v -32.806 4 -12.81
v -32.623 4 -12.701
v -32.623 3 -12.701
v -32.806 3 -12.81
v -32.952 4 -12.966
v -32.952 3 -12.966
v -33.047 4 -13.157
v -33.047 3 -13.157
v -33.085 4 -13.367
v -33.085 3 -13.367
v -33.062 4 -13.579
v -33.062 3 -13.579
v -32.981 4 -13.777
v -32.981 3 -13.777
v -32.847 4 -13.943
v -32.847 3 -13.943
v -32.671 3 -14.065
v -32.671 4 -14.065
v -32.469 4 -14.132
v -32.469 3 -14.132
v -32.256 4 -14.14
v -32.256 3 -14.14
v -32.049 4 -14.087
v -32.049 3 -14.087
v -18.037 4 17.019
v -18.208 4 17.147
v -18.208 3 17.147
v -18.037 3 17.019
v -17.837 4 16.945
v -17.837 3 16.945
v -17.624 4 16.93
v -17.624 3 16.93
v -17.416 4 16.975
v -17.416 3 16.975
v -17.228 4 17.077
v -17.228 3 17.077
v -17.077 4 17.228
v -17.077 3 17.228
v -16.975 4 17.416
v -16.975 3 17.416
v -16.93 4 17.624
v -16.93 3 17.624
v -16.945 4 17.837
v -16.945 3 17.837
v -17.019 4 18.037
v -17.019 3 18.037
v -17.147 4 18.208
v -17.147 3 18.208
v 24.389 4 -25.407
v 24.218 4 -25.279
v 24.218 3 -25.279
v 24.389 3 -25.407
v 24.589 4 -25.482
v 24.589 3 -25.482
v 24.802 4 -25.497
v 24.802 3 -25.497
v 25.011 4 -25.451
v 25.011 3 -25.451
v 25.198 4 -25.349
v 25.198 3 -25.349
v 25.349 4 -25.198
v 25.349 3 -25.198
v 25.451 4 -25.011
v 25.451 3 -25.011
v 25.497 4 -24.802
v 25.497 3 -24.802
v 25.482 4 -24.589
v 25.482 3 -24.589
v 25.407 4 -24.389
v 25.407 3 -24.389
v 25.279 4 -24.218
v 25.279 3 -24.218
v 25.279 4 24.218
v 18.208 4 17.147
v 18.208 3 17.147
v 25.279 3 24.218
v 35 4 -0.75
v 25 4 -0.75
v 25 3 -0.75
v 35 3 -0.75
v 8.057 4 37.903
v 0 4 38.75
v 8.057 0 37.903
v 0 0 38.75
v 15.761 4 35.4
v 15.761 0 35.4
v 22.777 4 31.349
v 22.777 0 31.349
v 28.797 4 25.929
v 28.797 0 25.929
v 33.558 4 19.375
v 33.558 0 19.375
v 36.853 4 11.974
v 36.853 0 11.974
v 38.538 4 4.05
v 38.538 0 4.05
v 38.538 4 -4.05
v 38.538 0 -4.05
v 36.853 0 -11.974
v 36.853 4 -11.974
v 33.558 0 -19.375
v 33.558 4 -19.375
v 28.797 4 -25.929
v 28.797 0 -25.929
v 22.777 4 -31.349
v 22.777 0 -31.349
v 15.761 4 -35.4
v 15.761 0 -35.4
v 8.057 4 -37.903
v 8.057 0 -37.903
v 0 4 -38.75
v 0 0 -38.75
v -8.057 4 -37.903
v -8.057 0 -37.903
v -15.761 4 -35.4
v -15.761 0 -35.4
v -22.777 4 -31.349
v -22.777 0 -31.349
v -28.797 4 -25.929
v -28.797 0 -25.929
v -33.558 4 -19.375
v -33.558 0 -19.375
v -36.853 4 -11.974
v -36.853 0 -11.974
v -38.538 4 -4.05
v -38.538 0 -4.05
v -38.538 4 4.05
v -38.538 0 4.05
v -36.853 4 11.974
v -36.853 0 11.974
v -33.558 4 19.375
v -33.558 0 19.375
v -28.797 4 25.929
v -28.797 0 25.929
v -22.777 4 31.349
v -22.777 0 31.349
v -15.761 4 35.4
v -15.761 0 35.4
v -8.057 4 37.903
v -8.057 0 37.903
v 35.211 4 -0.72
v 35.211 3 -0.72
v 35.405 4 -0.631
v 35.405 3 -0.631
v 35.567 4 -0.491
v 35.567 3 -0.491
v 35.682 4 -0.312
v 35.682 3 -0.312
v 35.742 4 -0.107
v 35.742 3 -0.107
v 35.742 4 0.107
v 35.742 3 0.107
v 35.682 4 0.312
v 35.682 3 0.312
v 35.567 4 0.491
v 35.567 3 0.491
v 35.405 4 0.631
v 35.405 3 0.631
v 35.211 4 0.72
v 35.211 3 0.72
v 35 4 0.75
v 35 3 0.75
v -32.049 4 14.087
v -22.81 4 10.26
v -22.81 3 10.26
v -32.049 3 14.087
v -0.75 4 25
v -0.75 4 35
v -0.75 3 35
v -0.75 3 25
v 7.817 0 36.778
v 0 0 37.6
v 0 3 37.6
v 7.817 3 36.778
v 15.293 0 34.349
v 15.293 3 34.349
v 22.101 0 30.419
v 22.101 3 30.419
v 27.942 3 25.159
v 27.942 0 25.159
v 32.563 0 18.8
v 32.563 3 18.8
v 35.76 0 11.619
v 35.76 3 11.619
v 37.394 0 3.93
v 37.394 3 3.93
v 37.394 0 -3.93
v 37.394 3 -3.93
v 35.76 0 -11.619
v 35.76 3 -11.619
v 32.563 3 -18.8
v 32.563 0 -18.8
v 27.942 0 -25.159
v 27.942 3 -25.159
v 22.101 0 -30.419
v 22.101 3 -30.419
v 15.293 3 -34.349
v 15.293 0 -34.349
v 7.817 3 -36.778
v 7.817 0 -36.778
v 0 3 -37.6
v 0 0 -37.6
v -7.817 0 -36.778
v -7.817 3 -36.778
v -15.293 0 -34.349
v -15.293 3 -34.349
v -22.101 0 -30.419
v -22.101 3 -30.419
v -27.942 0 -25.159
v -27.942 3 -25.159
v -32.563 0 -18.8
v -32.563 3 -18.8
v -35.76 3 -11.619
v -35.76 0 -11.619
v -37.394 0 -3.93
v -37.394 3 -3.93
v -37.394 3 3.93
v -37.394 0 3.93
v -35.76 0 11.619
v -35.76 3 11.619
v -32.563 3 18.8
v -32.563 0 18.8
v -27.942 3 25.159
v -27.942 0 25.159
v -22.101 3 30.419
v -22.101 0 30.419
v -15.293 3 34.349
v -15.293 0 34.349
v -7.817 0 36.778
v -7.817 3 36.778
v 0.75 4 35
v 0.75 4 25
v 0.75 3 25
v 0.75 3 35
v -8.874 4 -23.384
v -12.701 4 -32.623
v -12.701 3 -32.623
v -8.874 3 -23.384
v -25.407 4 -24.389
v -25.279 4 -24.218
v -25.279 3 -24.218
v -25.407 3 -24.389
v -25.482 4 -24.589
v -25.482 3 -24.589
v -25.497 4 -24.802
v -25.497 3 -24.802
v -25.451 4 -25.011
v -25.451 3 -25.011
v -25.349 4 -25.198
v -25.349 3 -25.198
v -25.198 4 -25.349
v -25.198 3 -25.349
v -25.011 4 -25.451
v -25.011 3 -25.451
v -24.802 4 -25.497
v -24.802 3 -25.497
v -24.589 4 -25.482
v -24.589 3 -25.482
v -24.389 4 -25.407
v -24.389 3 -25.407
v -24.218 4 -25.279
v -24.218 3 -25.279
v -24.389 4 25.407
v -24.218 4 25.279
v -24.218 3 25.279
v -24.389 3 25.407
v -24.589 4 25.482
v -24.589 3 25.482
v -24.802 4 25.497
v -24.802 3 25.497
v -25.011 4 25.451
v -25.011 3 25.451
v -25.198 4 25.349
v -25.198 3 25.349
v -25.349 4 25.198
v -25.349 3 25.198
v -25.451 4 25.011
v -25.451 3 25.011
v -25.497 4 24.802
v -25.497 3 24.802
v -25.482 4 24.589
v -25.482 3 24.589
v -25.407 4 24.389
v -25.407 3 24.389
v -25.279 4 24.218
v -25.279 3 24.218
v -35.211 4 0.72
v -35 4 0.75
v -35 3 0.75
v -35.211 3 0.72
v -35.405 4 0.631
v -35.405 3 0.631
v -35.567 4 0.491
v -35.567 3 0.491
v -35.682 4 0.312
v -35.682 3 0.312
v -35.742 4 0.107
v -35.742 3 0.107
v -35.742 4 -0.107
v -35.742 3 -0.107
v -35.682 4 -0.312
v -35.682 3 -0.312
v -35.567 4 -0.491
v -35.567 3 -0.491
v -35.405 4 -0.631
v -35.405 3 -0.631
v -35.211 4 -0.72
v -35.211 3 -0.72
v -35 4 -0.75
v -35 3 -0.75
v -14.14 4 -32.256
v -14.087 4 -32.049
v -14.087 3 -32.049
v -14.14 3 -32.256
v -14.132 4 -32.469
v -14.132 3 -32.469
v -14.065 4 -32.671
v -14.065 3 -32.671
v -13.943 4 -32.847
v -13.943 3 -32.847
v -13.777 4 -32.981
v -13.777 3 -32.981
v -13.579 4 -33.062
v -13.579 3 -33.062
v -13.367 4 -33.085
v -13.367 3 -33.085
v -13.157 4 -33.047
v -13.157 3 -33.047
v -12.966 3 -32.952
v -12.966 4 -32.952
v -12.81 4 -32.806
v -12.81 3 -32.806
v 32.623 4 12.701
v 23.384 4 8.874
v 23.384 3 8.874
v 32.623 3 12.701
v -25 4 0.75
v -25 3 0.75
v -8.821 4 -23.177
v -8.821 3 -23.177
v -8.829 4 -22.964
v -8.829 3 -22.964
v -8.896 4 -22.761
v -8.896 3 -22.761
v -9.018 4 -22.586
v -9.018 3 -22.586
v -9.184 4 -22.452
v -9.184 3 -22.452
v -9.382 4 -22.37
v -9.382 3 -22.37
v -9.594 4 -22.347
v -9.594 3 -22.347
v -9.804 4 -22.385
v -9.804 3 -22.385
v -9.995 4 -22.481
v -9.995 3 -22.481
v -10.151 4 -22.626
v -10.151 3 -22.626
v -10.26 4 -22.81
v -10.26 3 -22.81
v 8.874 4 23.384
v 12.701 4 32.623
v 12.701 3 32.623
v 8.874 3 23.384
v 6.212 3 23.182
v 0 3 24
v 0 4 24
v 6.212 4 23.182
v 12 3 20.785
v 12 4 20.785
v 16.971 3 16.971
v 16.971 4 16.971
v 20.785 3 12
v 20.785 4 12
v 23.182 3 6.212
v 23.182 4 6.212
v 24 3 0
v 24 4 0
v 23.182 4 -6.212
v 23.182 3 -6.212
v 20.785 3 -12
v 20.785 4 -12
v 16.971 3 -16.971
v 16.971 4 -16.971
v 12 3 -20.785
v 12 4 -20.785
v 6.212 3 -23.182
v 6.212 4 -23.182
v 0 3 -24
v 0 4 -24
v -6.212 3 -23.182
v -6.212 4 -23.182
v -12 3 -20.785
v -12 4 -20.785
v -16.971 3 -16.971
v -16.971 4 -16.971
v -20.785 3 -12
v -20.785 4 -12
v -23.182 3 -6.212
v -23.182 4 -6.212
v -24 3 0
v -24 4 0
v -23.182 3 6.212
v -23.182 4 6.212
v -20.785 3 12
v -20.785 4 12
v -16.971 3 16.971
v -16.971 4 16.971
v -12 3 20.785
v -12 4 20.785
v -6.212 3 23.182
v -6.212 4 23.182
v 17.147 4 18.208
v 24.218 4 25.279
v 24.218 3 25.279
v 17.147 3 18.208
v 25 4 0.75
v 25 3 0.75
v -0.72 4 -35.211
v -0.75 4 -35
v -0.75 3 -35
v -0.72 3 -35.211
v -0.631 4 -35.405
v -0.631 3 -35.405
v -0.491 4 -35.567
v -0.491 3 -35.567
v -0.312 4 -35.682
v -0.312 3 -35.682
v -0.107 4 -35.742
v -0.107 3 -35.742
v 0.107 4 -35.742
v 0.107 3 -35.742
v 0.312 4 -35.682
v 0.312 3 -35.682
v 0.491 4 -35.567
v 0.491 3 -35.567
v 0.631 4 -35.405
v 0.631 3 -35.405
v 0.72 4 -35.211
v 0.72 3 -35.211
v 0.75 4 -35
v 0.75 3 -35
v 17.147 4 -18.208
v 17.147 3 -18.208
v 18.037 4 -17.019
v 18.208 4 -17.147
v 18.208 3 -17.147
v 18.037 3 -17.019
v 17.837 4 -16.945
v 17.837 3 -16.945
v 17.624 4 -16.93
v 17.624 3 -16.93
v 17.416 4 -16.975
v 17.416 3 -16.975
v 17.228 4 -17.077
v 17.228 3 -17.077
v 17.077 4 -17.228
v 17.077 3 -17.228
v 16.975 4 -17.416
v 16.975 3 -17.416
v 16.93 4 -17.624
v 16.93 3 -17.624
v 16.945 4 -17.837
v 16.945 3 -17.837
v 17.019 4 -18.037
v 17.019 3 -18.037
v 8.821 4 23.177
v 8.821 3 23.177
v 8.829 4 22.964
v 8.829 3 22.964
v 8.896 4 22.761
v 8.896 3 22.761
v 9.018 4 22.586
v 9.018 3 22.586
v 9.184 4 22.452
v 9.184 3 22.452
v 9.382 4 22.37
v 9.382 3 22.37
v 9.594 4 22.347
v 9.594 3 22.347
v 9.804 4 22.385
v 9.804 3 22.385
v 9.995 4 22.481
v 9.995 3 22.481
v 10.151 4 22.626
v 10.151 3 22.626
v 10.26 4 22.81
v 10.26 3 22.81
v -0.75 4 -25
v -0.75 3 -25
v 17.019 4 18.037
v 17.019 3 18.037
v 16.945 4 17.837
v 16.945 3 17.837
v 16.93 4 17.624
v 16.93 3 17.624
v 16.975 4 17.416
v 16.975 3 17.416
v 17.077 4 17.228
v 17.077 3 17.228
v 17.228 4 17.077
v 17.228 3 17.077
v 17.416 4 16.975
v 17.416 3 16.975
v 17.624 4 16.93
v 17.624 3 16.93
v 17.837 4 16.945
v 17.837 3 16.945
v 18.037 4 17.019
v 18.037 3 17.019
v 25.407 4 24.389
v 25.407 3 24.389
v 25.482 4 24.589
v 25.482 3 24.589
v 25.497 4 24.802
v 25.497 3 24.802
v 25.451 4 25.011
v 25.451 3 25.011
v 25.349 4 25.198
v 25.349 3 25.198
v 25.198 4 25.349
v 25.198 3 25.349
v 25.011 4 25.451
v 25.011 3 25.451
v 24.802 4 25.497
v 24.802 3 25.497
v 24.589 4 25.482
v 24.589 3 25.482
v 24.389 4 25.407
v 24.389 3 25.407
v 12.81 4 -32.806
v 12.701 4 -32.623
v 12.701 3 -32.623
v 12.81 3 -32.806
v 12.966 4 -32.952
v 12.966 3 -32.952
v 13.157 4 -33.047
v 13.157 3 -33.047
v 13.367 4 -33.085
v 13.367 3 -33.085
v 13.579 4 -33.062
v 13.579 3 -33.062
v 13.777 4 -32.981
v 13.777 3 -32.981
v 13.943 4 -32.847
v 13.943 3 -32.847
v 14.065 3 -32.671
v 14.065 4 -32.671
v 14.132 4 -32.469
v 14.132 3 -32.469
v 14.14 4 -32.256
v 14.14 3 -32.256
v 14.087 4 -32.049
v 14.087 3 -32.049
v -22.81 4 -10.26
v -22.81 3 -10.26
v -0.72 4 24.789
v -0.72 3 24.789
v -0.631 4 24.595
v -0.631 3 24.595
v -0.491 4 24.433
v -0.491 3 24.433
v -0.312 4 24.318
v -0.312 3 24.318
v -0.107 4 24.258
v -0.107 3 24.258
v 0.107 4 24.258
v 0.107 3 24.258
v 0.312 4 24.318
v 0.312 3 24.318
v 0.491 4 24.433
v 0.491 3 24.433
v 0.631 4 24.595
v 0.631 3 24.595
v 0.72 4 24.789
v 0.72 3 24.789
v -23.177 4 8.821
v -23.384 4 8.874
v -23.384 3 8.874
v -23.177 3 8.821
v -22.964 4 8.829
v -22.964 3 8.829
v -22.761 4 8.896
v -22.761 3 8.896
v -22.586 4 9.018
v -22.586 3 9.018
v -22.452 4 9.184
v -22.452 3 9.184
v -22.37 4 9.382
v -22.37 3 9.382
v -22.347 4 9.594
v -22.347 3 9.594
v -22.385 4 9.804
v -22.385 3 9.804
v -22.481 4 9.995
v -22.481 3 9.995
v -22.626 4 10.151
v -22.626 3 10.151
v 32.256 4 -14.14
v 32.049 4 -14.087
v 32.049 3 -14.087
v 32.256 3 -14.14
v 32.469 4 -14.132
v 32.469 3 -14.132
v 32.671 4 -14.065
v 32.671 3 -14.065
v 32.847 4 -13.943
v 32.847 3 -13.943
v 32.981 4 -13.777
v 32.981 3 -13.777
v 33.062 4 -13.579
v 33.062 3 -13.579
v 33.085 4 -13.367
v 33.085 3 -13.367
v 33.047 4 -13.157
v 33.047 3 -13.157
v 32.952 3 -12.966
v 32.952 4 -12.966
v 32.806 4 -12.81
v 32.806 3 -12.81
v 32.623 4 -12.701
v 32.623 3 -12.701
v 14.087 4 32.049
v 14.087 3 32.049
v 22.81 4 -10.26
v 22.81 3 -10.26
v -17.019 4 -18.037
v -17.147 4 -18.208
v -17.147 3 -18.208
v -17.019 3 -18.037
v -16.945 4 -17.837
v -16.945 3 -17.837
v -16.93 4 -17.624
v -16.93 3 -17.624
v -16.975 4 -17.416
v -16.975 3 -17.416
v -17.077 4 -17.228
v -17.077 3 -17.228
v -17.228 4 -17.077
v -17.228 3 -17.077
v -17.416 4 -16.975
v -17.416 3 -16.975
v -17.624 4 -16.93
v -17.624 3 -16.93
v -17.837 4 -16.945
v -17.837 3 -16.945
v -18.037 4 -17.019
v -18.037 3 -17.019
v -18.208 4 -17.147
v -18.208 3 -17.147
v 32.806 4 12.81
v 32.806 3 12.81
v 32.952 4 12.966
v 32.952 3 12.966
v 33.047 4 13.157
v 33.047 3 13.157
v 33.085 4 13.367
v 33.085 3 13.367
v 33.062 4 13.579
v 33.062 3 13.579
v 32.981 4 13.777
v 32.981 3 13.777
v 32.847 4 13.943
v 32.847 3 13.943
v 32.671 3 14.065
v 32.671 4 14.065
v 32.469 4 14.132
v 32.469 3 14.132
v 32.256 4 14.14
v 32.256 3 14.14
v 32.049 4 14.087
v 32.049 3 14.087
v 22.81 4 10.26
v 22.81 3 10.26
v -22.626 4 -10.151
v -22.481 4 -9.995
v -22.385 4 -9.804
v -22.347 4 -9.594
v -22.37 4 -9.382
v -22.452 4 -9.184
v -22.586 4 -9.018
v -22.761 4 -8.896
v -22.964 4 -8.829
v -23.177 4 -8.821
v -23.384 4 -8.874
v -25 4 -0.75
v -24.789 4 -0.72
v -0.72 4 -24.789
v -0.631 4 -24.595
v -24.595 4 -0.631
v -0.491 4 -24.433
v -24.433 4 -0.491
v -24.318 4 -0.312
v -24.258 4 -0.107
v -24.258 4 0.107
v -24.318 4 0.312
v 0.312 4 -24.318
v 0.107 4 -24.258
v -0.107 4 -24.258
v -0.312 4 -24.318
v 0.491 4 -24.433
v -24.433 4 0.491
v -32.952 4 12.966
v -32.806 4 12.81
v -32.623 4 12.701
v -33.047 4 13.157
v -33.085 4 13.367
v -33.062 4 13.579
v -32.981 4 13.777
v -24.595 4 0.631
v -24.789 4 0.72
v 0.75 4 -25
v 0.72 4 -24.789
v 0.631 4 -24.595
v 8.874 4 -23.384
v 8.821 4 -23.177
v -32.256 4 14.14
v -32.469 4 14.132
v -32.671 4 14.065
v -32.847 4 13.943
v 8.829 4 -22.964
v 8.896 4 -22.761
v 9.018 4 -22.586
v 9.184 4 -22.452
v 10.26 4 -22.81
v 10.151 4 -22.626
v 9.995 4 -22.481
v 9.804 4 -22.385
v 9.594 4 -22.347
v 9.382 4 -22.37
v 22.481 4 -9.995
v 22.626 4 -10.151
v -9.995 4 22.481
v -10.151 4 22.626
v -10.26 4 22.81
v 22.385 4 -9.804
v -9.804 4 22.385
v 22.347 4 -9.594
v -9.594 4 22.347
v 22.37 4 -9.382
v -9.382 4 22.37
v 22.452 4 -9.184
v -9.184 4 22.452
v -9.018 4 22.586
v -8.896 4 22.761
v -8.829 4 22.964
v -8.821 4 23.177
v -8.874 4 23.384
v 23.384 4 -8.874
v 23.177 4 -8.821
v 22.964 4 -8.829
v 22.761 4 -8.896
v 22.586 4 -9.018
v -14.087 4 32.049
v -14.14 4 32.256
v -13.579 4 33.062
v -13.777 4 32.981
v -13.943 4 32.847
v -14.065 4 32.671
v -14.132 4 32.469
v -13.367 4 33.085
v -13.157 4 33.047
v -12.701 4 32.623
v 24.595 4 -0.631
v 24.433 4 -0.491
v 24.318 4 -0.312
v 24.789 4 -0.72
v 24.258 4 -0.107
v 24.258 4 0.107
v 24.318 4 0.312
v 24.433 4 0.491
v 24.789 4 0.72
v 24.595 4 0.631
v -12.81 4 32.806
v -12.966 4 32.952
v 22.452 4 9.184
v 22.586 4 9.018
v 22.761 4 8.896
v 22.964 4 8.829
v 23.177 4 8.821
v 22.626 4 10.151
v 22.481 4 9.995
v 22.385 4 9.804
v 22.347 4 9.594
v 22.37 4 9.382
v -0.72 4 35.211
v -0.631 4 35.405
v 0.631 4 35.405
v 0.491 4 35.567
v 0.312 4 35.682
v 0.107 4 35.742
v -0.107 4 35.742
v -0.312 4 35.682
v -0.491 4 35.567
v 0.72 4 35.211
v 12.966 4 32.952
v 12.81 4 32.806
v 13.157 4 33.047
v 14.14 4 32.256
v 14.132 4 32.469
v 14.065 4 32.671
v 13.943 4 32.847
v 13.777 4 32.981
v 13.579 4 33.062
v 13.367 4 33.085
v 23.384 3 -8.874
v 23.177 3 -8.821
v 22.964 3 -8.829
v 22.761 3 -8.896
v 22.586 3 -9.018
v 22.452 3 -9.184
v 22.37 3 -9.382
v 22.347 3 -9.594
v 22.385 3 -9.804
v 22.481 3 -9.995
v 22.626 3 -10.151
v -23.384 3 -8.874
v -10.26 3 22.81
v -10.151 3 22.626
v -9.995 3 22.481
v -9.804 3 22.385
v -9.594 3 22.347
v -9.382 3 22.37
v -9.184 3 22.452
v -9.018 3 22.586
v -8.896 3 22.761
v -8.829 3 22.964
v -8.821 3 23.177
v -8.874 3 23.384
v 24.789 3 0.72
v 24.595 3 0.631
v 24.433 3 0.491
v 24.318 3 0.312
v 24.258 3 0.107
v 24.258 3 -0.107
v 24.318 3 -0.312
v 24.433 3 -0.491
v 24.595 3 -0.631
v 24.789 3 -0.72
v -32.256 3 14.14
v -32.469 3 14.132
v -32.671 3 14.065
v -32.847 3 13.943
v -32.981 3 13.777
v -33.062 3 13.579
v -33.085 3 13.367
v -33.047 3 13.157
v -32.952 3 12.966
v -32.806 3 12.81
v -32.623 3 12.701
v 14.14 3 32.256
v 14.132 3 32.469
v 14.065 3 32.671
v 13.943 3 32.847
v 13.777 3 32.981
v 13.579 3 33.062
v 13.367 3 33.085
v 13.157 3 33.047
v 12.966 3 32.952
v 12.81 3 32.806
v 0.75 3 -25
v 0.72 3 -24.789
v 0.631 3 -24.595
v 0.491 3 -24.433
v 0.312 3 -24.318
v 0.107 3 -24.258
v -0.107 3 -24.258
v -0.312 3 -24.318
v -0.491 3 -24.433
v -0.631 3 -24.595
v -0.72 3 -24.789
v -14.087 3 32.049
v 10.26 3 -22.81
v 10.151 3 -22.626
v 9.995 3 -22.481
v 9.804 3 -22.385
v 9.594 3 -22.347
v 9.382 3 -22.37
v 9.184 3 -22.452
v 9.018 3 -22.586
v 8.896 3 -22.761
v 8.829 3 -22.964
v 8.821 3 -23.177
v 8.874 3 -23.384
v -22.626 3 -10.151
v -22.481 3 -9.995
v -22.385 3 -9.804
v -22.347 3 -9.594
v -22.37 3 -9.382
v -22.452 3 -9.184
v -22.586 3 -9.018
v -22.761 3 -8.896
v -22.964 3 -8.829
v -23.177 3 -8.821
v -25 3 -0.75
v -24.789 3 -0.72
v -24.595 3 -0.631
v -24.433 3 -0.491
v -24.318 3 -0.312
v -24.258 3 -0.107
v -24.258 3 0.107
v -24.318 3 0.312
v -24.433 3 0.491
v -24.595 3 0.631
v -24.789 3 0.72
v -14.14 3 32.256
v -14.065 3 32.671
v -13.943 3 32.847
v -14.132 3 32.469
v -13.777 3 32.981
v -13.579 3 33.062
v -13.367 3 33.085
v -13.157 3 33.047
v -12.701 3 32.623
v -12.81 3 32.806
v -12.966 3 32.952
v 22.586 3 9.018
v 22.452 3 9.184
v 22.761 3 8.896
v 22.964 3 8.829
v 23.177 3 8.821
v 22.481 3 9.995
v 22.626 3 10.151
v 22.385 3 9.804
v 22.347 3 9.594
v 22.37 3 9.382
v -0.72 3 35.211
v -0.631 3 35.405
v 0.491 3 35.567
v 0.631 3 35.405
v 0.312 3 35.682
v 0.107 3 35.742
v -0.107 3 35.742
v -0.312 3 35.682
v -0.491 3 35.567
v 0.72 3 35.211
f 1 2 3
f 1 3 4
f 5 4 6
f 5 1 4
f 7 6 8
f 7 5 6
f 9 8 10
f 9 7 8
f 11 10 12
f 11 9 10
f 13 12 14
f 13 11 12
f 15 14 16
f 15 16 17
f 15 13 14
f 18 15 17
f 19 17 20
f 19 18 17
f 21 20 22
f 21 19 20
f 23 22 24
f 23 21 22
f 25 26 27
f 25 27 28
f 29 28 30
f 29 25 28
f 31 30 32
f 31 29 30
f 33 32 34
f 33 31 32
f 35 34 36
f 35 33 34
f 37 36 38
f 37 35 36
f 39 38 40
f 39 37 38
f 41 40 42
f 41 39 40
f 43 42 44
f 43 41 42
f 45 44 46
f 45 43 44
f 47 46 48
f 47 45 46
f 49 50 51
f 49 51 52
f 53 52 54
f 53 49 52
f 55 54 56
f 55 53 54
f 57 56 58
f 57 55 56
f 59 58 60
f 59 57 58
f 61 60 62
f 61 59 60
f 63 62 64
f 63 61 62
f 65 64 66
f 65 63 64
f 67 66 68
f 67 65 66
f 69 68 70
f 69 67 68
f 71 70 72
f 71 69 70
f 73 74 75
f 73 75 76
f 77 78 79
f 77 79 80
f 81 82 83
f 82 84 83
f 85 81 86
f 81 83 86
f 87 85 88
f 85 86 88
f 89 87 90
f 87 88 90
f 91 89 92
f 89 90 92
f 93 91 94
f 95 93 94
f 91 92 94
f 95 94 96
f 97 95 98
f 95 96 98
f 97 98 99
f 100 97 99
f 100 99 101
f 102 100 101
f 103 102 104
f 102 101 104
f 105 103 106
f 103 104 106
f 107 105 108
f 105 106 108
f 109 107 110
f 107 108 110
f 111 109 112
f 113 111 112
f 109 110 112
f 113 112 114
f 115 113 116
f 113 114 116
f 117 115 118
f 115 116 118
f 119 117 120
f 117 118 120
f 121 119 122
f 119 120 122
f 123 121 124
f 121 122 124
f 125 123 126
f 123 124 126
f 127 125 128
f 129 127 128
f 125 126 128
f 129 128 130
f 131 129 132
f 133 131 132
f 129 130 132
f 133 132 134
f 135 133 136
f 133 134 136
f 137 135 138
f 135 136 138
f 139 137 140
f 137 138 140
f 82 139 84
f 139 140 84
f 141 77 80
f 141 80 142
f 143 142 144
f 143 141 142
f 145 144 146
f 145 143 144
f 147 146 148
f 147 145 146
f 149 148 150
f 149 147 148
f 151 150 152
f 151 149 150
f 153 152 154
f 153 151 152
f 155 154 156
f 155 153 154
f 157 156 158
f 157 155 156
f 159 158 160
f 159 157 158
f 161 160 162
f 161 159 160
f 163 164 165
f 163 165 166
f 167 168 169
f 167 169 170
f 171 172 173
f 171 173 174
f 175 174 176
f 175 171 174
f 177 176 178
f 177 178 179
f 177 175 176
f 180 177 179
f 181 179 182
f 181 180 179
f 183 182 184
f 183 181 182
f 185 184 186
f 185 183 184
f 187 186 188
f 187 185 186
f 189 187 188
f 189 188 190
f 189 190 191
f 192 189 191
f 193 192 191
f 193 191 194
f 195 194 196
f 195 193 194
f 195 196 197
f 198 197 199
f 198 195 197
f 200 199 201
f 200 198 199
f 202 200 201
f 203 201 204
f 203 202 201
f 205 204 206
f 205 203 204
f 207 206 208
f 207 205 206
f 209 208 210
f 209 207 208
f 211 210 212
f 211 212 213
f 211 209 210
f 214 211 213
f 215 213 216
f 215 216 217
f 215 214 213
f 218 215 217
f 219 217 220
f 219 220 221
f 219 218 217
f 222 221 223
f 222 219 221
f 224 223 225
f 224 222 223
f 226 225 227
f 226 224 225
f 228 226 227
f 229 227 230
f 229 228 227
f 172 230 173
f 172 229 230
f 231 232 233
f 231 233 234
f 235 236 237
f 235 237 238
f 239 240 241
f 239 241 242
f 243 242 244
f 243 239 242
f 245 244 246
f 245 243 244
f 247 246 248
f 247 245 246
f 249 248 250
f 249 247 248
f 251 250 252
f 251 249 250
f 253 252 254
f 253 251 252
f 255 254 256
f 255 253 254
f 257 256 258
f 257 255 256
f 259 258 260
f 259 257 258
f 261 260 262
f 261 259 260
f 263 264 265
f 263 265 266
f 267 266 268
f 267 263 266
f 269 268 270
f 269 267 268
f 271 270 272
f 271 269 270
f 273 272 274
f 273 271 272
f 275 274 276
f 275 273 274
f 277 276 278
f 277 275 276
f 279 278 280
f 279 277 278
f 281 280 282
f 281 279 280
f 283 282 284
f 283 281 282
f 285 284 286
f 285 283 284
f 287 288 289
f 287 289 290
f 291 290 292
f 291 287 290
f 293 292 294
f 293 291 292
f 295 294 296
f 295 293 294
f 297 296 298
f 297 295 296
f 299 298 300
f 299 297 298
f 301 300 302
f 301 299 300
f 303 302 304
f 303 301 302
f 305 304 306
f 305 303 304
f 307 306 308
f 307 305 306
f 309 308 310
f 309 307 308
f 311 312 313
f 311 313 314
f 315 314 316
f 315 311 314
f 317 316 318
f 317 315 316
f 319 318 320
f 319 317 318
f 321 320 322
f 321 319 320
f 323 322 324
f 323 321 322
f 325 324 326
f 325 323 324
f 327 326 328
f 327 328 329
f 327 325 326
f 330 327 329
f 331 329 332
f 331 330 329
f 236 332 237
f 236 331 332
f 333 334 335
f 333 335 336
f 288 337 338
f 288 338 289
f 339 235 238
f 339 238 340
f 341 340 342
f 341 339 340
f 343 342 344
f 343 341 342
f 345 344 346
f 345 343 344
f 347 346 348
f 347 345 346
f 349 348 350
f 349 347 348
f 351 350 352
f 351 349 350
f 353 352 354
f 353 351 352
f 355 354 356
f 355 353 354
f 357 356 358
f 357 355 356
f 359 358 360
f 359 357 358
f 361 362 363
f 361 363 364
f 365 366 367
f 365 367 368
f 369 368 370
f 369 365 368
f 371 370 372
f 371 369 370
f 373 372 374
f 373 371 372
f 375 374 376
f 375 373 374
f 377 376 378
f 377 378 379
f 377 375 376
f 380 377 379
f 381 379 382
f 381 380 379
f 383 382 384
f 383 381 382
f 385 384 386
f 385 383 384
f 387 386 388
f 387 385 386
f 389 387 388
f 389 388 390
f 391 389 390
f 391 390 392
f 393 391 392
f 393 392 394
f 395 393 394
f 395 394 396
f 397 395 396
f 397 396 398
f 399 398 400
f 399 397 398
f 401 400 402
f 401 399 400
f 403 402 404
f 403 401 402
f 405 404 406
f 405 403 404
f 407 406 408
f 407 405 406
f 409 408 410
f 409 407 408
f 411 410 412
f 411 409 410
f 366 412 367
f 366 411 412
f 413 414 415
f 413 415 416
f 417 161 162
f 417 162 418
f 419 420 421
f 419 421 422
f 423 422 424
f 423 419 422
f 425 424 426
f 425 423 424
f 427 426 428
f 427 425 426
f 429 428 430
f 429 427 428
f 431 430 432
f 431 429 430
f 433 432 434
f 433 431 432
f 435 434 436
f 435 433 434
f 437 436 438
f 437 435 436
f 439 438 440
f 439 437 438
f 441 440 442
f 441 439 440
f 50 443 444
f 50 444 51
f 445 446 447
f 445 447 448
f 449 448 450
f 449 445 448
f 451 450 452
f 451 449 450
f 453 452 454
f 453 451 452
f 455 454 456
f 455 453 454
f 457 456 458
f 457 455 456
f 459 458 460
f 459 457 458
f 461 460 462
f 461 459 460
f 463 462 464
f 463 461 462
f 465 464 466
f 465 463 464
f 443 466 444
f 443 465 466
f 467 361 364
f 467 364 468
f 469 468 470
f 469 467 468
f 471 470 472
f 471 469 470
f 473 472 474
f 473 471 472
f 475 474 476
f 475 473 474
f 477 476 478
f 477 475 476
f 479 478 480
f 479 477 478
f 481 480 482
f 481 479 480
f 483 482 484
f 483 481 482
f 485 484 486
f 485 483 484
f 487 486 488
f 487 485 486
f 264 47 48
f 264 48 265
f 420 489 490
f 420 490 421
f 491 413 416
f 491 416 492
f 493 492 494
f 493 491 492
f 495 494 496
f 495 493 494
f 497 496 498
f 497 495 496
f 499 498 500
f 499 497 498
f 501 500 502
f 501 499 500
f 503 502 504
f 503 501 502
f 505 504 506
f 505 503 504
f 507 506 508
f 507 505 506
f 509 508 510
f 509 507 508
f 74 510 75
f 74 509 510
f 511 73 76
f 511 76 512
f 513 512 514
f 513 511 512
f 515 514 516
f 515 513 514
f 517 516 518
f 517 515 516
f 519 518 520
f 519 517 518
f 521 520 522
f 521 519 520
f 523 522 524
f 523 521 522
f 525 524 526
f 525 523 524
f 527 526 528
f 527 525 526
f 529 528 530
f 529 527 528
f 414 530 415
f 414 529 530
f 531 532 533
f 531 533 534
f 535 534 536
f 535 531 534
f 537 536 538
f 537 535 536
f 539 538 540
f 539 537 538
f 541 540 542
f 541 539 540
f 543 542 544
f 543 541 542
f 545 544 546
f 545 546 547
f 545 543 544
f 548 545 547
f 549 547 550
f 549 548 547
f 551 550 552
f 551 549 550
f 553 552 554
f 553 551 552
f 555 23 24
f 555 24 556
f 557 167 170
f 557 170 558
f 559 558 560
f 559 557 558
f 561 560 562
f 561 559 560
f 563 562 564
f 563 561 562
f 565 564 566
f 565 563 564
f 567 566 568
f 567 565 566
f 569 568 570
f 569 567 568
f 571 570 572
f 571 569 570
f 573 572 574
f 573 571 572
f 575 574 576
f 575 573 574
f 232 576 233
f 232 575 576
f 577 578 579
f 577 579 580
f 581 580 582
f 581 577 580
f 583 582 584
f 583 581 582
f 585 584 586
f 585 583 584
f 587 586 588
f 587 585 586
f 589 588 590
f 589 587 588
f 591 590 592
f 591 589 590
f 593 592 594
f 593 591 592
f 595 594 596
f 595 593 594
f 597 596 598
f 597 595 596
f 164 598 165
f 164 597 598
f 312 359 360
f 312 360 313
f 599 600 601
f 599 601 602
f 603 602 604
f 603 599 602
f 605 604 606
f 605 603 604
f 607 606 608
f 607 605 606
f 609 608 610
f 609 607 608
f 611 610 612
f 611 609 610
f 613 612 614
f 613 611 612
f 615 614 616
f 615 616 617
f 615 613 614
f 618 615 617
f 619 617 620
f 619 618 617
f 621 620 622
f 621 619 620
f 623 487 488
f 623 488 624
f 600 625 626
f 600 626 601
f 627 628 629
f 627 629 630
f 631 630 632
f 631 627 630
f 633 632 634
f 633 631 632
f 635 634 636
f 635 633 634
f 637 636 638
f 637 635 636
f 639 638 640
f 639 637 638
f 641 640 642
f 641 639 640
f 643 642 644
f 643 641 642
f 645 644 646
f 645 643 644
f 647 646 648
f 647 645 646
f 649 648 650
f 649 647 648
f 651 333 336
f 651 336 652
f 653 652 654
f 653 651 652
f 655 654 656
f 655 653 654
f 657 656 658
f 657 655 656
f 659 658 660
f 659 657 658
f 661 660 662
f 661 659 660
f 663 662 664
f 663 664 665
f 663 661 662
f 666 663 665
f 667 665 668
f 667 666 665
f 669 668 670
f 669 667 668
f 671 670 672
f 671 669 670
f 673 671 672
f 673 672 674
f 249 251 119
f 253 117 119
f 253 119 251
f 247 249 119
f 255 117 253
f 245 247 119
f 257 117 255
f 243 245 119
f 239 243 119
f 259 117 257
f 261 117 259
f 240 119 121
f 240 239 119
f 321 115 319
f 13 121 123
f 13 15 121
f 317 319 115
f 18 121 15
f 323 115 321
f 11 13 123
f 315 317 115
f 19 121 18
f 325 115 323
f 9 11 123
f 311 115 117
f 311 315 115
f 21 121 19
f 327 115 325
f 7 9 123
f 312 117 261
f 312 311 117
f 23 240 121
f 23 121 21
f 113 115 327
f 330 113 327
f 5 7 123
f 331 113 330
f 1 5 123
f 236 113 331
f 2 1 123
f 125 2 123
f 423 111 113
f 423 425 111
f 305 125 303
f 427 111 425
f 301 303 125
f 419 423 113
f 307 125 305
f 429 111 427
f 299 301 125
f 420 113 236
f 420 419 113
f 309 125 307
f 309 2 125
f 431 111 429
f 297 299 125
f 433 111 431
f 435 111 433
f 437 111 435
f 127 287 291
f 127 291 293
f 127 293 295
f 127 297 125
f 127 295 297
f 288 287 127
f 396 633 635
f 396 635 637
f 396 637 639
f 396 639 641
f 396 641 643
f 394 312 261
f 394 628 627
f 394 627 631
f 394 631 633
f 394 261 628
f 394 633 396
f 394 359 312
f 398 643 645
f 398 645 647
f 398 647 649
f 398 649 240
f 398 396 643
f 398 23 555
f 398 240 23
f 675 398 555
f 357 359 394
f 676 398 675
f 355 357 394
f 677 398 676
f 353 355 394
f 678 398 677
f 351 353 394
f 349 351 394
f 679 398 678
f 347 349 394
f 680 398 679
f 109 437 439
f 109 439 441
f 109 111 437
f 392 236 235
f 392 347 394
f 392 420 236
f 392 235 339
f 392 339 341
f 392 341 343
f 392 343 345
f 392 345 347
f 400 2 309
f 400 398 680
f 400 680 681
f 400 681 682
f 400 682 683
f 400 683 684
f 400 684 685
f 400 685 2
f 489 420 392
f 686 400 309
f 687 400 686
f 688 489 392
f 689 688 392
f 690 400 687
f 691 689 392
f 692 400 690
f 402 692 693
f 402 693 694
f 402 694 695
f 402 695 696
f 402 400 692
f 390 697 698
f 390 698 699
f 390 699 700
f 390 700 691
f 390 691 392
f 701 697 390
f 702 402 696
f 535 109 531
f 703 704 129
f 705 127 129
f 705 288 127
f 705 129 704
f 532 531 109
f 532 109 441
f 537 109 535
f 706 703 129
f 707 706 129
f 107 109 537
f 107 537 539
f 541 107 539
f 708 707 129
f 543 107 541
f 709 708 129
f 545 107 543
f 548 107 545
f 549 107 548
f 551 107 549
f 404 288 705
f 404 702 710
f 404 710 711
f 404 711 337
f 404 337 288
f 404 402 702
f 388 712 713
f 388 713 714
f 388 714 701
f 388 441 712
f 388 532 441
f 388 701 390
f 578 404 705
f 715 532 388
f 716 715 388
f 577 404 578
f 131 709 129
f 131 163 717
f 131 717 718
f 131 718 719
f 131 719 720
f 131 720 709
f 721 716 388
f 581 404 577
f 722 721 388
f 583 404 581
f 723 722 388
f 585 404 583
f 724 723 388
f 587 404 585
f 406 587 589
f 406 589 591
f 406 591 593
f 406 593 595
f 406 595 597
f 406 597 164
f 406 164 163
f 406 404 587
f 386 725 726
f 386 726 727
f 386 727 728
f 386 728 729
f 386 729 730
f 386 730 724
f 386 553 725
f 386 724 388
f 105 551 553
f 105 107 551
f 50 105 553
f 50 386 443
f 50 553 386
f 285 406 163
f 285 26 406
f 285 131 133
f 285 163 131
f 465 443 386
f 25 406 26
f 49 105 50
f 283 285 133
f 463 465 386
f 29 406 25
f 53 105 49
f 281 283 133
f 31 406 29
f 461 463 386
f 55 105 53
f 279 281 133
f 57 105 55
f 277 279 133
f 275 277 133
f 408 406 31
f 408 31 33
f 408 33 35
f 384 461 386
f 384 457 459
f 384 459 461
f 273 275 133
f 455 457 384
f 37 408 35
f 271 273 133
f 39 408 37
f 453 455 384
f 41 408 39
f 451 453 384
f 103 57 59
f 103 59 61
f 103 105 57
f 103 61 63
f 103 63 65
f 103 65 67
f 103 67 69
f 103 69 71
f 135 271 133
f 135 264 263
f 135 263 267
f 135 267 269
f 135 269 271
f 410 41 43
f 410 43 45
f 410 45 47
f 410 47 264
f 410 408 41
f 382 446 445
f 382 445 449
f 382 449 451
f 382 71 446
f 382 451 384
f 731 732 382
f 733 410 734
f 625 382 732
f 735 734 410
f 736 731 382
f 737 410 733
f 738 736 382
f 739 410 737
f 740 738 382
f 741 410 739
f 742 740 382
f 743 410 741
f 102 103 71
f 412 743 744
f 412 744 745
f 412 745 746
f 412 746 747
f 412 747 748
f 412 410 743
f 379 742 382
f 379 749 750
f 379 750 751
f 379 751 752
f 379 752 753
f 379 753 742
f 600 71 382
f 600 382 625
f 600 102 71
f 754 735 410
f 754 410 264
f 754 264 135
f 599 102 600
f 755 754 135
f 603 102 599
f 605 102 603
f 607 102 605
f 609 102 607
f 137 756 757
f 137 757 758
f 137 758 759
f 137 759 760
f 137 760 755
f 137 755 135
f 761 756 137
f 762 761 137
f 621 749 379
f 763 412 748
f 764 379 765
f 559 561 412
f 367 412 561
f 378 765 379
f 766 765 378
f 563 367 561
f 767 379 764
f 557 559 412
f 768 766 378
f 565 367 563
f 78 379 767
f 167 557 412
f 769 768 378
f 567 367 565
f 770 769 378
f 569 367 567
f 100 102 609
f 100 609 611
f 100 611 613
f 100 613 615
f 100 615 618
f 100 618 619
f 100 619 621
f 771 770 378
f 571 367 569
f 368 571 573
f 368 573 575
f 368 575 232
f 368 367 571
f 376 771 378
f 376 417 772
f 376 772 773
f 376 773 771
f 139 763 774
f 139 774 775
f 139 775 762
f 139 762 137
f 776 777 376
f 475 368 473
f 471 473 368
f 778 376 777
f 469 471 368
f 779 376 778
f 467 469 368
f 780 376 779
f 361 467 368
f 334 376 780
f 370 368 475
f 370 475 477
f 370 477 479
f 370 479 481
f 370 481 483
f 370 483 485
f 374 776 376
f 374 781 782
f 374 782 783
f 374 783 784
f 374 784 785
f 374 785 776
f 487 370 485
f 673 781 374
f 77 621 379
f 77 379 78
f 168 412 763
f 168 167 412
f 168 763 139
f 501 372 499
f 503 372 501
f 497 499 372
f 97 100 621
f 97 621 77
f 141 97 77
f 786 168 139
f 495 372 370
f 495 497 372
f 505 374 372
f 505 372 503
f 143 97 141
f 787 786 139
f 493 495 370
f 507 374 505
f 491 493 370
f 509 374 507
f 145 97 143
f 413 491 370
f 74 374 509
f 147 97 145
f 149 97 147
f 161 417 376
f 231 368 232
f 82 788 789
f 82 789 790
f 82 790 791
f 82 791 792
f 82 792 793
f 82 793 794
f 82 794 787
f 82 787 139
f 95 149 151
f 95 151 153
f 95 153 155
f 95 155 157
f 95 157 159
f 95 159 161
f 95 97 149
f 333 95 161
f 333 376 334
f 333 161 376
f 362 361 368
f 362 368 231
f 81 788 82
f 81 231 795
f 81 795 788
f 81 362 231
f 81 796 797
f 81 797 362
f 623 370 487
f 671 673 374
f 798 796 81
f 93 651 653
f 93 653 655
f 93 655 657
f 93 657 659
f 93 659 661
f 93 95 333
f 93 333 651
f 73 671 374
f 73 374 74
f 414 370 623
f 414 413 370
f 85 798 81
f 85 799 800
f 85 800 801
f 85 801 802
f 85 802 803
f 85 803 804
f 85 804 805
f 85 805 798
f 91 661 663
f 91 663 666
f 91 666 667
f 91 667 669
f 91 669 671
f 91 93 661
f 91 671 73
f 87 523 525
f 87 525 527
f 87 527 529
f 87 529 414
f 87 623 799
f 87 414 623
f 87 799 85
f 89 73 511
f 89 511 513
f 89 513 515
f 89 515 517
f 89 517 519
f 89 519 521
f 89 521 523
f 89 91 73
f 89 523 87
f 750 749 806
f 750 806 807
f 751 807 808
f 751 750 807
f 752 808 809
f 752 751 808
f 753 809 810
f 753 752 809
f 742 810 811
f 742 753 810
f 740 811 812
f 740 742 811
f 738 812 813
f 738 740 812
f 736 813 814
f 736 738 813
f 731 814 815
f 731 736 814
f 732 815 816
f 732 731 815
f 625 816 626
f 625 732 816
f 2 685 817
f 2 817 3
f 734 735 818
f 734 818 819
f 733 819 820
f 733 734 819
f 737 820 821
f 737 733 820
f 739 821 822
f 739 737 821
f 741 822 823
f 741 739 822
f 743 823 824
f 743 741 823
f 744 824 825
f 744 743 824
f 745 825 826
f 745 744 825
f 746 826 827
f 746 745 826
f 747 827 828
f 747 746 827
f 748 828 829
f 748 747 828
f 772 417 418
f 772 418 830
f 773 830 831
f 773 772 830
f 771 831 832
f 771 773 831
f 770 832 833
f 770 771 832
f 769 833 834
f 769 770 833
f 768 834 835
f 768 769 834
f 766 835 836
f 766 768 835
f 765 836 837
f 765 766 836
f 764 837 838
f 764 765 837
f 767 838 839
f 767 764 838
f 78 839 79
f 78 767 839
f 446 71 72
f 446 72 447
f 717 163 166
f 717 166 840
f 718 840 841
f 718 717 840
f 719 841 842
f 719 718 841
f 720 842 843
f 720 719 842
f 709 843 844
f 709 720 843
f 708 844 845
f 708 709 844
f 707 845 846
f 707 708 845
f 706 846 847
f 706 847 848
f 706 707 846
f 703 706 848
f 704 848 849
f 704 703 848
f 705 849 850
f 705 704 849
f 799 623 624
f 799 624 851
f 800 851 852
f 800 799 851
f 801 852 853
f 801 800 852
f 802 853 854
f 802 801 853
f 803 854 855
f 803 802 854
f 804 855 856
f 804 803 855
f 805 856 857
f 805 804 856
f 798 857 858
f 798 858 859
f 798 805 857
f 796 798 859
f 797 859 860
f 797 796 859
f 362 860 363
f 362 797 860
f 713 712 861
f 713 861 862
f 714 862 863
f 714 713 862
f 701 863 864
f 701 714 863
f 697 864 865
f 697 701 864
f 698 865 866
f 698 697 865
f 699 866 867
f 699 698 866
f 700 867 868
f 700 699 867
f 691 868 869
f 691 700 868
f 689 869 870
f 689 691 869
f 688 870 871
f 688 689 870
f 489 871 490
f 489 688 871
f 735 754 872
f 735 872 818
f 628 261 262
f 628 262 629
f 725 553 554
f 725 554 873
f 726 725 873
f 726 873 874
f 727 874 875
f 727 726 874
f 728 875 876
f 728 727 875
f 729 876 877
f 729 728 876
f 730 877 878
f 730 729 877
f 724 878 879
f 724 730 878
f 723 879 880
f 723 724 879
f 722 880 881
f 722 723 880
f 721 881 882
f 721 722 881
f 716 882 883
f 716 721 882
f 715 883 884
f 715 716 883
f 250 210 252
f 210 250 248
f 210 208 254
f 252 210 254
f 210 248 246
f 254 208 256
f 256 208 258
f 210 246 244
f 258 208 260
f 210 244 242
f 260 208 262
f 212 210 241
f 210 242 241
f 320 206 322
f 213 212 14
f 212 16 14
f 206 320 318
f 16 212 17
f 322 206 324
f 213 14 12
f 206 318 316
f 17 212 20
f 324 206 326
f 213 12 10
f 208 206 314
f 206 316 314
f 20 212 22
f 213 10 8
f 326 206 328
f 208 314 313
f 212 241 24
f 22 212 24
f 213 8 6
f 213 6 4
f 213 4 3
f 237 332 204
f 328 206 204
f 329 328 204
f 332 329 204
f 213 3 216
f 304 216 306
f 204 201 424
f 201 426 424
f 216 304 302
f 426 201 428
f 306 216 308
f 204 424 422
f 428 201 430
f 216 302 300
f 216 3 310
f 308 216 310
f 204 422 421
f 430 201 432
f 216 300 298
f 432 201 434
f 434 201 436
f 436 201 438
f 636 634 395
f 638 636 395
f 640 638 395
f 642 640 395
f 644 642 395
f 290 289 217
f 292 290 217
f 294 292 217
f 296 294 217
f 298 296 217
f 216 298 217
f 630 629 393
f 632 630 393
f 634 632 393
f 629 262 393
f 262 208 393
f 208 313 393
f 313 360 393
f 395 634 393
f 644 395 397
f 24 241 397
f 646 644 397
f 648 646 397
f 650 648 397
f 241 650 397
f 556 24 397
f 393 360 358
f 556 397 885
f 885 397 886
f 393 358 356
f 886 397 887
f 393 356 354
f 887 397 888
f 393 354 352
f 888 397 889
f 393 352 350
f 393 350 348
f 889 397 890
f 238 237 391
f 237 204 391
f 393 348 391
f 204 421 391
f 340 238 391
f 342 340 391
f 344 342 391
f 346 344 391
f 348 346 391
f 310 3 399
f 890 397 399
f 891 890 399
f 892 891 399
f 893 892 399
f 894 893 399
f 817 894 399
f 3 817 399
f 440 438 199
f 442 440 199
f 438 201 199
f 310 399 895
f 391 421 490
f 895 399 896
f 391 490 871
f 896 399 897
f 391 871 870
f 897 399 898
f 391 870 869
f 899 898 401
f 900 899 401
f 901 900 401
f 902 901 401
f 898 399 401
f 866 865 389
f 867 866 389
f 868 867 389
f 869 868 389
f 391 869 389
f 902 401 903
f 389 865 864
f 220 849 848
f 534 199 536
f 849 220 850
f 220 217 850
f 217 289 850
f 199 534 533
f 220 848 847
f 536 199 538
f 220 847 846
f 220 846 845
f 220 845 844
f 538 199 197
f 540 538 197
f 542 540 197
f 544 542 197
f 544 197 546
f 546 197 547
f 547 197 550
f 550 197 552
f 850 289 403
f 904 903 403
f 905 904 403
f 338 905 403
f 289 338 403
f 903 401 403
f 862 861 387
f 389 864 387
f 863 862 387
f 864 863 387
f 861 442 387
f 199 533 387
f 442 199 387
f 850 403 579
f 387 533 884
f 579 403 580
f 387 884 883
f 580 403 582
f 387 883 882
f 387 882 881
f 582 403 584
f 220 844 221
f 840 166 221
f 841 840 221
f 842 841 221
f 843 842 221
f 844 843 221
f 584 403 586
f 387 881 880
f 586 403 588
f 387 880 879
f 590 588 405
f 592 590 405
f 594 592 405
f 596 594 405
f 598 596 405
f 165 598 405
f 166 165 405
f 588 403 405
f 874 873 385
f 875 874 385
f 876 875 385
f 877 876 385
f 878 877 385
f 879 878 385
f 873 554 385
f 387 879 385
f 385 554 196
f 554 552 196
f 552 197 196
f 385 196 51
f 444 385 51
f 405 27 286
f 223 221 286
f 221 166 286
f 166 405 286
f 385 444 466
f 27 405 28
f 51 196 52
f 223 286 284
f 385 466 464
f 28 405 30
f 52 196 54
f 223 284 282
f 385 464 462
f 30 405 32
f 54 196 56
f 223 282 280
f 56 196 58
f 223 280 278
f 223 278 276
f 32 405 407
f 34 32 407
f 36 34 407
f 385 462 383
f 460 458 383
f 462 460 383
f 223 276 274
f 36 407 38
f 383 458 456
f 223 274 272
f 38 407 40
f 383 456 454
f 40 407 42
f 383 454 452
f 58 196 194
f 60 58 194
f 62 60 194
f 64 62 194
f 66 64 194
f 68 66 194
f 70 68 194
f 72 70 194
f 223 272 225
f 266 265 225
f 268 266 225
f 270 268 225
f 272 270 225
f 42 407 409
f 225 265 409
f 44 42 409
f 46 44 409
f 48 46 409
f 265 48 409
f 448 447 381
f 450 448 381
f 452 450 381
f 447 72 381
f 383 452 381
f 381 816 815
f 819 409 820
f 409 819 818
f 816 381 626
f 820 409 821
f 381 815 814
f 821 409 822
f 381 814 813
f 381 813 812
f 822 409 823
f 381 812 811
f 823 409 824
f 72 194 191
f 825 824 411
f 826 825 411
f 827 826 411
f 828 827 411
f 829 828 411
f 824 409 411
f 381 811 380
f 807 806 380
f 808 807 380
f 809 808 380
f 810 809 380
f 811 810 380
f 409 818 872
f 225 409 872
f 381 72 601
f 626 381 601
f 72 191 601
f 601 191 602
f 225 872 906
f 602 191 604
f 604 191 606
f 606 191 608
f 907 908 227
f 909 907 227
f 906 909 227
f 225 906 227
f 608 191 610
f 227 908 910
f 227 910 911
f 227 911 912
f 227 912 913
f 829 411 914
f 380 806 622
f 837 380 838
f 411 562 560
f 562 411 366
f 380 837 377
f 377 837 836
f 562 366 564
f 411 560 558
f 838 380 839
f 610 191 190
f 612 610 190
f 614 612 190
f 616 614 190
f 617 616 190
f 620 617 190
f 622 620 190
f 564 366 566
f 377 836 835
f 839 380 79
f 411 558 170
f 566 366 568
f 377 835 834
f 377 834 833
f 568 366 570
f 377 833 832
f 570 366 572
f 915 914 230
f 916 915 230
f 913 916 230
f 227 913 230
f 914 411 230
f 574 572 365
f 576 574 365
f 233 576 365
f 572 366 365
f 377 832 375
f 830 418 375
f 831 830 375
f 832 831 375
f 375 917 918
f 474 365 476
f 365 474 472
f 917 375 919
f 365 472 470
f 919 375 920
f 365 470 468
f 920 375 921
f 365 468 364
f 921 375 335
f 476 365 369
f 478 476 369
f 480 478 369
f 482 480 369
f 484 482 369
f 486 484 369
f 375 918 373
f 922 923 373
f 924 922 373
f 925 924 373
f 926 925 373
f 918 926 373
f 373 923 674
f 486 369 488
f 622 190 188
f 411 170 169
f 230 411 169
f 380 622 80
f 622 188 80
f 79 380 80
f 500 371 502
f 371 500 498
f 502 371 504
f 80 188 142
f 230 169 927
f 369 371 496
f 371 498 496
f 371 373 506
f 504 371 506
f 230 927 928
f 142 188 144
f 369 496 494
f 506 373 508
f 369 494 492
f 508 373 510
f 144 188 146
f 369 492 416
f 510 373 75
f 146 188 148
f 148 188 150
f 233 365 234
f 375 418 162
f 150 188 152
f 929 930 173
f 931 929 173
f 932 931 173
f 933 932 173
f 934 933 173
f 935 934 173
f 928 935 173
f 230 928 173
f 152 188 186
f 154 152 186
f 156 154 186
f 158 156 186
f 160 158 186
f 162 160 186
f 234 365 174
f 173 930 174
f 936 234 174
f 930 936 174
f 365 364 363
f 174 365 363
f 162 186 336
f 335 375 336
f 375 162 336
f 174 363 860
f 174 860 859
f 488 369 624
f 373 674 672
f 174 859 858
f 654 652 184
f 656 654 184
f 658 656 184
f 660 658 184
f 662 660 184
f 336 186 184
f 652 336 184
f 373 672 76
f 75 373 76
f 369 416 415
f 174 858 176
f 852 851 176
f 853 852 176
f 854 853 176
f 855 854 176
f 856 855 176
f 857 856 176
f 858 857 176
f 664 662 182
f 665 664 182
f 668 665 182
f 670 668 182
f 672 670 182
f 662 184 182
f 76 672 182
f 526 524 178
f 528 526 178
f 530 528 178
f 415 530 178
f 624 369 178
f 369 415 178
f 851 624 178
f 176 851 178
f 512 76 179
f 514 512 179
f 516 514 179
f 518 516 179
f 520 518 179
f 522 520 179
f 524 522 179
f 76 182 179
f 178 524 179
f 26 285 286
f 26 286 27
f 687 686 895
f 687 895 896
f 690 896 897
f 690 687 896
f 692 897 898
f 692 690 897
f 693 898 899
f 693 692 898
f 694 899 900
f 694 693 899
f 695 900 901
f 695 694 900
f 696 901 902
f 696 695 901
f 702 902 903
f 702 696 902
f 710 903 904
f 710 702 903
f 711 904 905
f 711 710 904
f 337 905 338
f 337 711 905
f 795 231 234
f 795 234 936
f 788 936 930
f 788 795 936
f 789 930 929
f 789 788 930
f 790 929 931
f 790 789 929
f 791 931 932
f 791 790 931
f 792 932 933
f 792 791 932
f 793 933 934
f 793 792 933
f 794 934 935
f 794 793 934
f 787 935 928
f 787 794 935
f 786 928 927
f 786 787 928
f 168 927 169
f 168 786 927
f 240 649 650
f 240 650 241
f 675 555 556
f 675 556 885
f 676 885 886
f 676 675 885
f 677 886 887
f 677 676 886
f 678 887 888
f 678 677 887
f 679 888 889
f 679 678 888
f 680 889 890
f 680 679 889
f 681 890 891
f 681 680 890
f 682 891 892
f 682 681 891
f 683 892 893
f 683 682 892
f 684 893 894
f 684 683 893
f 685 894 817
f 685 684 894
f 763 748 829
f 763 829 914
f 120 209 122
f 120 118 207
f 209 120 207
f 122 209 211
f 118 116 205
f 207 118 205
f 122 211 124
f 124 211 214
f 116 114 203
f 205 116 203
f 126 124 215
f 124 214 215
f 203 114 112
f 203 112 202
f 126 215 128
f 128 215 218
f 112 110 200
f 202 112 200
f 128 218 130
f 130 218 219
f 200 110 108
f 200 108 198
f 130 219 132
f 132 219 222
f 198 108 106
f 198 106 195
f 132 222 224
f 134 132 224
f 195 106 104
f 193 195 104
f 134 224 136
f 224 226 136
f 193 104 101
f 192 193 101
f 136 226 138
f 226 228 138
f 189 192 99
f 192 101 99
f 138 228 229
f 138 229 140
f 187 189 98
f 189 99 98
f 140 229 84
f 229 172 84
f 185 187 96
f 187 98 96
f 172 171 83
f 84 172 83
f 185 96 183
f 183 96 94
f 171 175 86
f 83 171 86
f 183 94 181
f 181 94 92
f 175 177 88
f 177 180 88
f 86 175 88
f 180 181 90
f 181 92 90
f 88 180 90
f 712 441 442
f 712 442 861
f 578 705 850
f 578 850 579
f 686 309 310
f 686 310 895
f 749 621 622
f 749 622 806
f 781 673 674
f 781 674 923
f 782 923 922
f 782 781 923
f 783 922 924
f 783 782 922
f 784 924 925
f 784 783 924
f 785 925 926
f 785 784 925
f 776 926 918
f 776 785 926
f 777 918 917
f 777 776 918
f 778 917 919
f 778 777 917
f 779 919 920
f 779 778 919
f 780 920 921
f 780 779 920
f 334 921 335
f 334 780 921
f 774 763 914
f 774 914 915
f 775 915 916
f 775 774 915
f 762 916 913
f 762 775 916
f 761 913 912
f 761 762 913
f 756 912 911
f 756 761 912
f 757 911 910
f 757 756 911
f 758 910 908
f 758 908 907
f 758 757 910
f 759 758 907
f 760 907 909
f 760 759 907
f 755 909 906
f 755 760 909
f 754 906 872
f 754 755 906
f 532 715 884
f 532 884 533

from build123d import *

# Parameters (mm, degrees)
SKETCH1_R           = 38.75
SKETCH1_R_2         = 37.6
BOSS_EXTRUDE1_DEPTH = 3
SKETCH2_R           = 38.75
SKETCH2_R_2         = 24
BOSS_EXTRUDE2_DEPTH = 1
CUT_EXTRUDE3_DEPTH  = 1


with BuildPart() as part:
    # Sketch1 → Boss-Extrude1 (new body)
    with BuildSketch(Plane(origin=(0, 0, 0), x_dir=(1, 0, 0), z_dir=(0, 1, 0))):
        with Locations(Location((0, 0, 0), (0, 0, 270))):
            Circle(SKETCH1_R)
        with Locations(Location((0, 0, 0), (0, 0, 270))):
            Circle(SKETCH1_R_2, mode=Mode.SUBTRACT)
    extrude(amount=BOSS_EXTRUDE1_DEPTH)

    # Sketch2 → Boss-Extrude2 (add)
    with BuildSketch(Plane(origin=(0, 3, 0), x_dir=(1, 0, 0), z_dir=(0, 1, 0))):
        with Locations(Location((0, 0, 0), (0, 0, 270))):
            Circle(SKETCH2_R)
        with Locations(Location((0, 0, 0), (0, 0, 270))):
            Circle(SKETCH2_R_2, mode=Mode.SUBTRACT)
    extrude(amount=BOSS_EXTRUDE2_DEPTH)

    # Sketch4 → Cut-Extrude3 (cut)
    with BuildSketch(Plane(origin=(0, 4, 0), x_dir=(1, 0, 0), z_dir=(0, 1, 0))):
        with BuildLine():
            Line((-0.75, 25), (-0.75, 35))
            ThreePointArc((-0.75, 35), (0, 35.75), (0.75, 35))
            Line((0.75, 35), (0.75, 25))
            ThreePointArc((0.75, 25), (0, 24.25), (-0.75, 25))
        make_face()
        with BuildLine():
            Line((8.87417616, 23.384000887), (12.701010483, 32.622796212))
            ThreePointArc((12.701010483, 32.622796212), (13.680932707, 33.028693287), (14.086829782, 32.048771064))
            Line((14.086829782, 32.048771064), (10.259995459, 22.809975739))
            ThreePointArc((10.259995459, 22.809975739), (9.280073235, 22.404078663), (8.87417616, 23.384000887))
        make_face()
        with BuildLine():
            Line((17.147339444, 18.207999616), (24.218407256, 25.279067427))
            ThreePointArc((24.218407256, 25.279067427), (25.279067427, 25.279067427), (25.279067427, 24.218407256))
            Line((25.279067427, 24.218407256), (18.207999616, 17.147339444))
            ThreePointArc((18.207999616, 17.147339444), (17.147339444, 17.147339444), (17.147339444, 18.207999616))
        make_face()
        with BuildLine():
            Line((22.809975739, 10.259995459), (32.048771064, 14.086829782))
            ThreePointArc((32.048771064, 14.086829782), (33.028693287, 13.680932707), (32.622796212, 12.701010483))
            Line((32.622796212, 12.701010483), (23.384000887, 8.87417616))
            ThreePointArc((23.384000887, 8.87417616), (22.404078663, 9.280073235), (22.809975739, 10.259995459))
        make_face()
        with BuildLine():
            Line((25, 0.75), (35, 0.75))
            ThreePointArc((35, 0.75), (35.75, 0), (35, -0.75))
            Line((35, -0.75), (25, -0.75))
            ThreePointArc((25, -0.75), (24.25, 0), (25, 0.75))
        make_face()
        with BuildLine():
            Line((23.384000887, -8.87417616), (32.622796212, -12.701010483))
            ThreePointArc((32.622796212, -12.701010483), (33.028693287, -13.680932707), (32.048771064, -14.086829782))
            Line((32.048771064, -14.086829782), (22.809975739, -10.259995459))
            ThreePointArc((22.809975739, -10.259995459), (22.404078663, -9.280073235), (23.384000887, -8.87417616))
        make_face()
        with BuildLine():
            Line((18.207999616, -17.147339444), (25.279067427, -24.218407256))
            ThreePointArc((25.279067427, -24.218407256), (25.279067427, -25.279067427), (24.218407256, -25.279067427))
            Line((24.218407256, -25.279067427), (17.147339444, -18.207999616))
            ThreePointArc((17.147339444, -18.207999616), (17.147339444, -17.147339444), (18.207999616, -17.147339444))
        make_face()
        with BuildLine():
            Line((10.259995459, -22.809975739), (14.086829782, -32.048771064))
            ThreePointArc((14.086829782, -32.048771064), (13.680932707, -33.028693287), (12.701010483, -32.622796212))
            Line((12.701010483, -32.622796212), (8.87417616, -23.384000887))
            ThreePointArc((8.87417616, -23.384000887), (9.280073235, -22.404078663), (10.259995459, -22.809975739))
        make_face()
        with BuildLine():
            Line((0.75, -25), (0.75, -35))
            ThreePointArc((0.75, -35), (0, -35.75), (-0.75, -35))
            Line((-0.75, -35), (-0.75, -25))
            ThreePointArc((-0.75, -25), (0, -24.25), (0.75, -25))
        make_face()
        with BuildLine():
            Line((-8.87417616, -23.384000887), (-12.701010483, -32.622796212))
            ThreePointArc((-12.701010483, -32.622796212), (-13.680932707, -33.028693287), (-14.086829782, -32.048771064))
            Line((-14.086829782, -32.048771064), (-10.259995459, -22.809975739))
            ThreePointArc((-10.259995459, -22.809975739), (-9.280073235, -22.404078663), (-8.87417616, -23.384000887))
        make_face()
        with BuildLine():
            Line((-17.147339444, -18.207999616), (-24.218407256, -25.279067427))
            ThreePointArc((-24.218407256, -25.279067427), (-25.279067427, -25.279067427), (-25.279067427, -24.218407256))
            Line((-25.279067427, -24.218407256), (-18.207999616, -17.147339444))
            ThreePointArc((-18.207999616, -17.147339444), (-17.147339444, -17.147339444), (-17.147339444, -18.207999616))
        make_face()
        with BuildLine():
            Line((-22.809975739, -10.259995459), (-32.048771064, -14.086829782))
            ThreePointArc((-32.048771064, -14.086829782), (-33.028693287, -13.680932707), (-32.622796212, -12.701010483))
            Line((-32.622796212, -12.701010483), (-23.384000887, -8.87417616))
            ThreePointArc((-23.384000887, -8.87417616), (-22.404078663, -9.280073235), (-22.809975739, -10.259995459))
        make_face()
        with BuildLine():
            Line((-25, -0.75), (-35, -0.75))
            ThreePointArc((-35, -0.75), (-35.75, 0), (-35, 0.75))
            Line((-35, 0.75), (-25, 0.75))
            ThreePointArc((-25, 0.75), (-24.25, 0), (-25, -0.75))
        make_face()
        with BuildLine():
            Line((-23.384000887, 8.87417616), (-32.622796212, 12.701010483))
            ThreePointArc((-32.622796212, 12.701010483), (-33.028693287, 13.680932707), (-32.048771064, 14.086829782))
            Line((-32.048771064, 14.086829782), (-22.809975739, 10.259995459))
            ThreePointArc((-22.809975739, 10.259995459), (-22.404078663, 9.280073235), (-23.384000887, 8.87417616))
        make_face()
        with BuildLine():
            Line((-18.207999616, 17.147339444), (-25.279067427, 24.218407256))
            ThreePointArc((-25.279067427, 24.218407256), (-25.279067427, 25.279067427), (-24.218407256, 25.279067427))
            Line((-24.218407256, 25.279067427), (-17.147339444, 18.207999616))
            ThreePointArc((-17.147339444, 18.207999616), (-17.147339444, 17.147339444), (-18.207999616, 17.147339444))
        make_face()
        with BuildLine():
            Line((-10.259995459, 22.809975739), (-14.086829782, 32.048771064))
            ThreePointArc((-14.086829782, 32.048771064), (-13.680932707, 33.028693287), (-12.701010483, 32.622796212))
            Line((-12.701010483, 32.622796212), (-8.87417616, 23.384000887))
            ThreePointArc((-8.87417616, 23.384000887), (-9.280073235, 22.404078663), (-10.259995459, 22.809975739))
        make_face()
    extrude(amount=-CUT_EXTRUDE3_DEPTH, mode=Mode.SUBTRACT)


solid = part.part
